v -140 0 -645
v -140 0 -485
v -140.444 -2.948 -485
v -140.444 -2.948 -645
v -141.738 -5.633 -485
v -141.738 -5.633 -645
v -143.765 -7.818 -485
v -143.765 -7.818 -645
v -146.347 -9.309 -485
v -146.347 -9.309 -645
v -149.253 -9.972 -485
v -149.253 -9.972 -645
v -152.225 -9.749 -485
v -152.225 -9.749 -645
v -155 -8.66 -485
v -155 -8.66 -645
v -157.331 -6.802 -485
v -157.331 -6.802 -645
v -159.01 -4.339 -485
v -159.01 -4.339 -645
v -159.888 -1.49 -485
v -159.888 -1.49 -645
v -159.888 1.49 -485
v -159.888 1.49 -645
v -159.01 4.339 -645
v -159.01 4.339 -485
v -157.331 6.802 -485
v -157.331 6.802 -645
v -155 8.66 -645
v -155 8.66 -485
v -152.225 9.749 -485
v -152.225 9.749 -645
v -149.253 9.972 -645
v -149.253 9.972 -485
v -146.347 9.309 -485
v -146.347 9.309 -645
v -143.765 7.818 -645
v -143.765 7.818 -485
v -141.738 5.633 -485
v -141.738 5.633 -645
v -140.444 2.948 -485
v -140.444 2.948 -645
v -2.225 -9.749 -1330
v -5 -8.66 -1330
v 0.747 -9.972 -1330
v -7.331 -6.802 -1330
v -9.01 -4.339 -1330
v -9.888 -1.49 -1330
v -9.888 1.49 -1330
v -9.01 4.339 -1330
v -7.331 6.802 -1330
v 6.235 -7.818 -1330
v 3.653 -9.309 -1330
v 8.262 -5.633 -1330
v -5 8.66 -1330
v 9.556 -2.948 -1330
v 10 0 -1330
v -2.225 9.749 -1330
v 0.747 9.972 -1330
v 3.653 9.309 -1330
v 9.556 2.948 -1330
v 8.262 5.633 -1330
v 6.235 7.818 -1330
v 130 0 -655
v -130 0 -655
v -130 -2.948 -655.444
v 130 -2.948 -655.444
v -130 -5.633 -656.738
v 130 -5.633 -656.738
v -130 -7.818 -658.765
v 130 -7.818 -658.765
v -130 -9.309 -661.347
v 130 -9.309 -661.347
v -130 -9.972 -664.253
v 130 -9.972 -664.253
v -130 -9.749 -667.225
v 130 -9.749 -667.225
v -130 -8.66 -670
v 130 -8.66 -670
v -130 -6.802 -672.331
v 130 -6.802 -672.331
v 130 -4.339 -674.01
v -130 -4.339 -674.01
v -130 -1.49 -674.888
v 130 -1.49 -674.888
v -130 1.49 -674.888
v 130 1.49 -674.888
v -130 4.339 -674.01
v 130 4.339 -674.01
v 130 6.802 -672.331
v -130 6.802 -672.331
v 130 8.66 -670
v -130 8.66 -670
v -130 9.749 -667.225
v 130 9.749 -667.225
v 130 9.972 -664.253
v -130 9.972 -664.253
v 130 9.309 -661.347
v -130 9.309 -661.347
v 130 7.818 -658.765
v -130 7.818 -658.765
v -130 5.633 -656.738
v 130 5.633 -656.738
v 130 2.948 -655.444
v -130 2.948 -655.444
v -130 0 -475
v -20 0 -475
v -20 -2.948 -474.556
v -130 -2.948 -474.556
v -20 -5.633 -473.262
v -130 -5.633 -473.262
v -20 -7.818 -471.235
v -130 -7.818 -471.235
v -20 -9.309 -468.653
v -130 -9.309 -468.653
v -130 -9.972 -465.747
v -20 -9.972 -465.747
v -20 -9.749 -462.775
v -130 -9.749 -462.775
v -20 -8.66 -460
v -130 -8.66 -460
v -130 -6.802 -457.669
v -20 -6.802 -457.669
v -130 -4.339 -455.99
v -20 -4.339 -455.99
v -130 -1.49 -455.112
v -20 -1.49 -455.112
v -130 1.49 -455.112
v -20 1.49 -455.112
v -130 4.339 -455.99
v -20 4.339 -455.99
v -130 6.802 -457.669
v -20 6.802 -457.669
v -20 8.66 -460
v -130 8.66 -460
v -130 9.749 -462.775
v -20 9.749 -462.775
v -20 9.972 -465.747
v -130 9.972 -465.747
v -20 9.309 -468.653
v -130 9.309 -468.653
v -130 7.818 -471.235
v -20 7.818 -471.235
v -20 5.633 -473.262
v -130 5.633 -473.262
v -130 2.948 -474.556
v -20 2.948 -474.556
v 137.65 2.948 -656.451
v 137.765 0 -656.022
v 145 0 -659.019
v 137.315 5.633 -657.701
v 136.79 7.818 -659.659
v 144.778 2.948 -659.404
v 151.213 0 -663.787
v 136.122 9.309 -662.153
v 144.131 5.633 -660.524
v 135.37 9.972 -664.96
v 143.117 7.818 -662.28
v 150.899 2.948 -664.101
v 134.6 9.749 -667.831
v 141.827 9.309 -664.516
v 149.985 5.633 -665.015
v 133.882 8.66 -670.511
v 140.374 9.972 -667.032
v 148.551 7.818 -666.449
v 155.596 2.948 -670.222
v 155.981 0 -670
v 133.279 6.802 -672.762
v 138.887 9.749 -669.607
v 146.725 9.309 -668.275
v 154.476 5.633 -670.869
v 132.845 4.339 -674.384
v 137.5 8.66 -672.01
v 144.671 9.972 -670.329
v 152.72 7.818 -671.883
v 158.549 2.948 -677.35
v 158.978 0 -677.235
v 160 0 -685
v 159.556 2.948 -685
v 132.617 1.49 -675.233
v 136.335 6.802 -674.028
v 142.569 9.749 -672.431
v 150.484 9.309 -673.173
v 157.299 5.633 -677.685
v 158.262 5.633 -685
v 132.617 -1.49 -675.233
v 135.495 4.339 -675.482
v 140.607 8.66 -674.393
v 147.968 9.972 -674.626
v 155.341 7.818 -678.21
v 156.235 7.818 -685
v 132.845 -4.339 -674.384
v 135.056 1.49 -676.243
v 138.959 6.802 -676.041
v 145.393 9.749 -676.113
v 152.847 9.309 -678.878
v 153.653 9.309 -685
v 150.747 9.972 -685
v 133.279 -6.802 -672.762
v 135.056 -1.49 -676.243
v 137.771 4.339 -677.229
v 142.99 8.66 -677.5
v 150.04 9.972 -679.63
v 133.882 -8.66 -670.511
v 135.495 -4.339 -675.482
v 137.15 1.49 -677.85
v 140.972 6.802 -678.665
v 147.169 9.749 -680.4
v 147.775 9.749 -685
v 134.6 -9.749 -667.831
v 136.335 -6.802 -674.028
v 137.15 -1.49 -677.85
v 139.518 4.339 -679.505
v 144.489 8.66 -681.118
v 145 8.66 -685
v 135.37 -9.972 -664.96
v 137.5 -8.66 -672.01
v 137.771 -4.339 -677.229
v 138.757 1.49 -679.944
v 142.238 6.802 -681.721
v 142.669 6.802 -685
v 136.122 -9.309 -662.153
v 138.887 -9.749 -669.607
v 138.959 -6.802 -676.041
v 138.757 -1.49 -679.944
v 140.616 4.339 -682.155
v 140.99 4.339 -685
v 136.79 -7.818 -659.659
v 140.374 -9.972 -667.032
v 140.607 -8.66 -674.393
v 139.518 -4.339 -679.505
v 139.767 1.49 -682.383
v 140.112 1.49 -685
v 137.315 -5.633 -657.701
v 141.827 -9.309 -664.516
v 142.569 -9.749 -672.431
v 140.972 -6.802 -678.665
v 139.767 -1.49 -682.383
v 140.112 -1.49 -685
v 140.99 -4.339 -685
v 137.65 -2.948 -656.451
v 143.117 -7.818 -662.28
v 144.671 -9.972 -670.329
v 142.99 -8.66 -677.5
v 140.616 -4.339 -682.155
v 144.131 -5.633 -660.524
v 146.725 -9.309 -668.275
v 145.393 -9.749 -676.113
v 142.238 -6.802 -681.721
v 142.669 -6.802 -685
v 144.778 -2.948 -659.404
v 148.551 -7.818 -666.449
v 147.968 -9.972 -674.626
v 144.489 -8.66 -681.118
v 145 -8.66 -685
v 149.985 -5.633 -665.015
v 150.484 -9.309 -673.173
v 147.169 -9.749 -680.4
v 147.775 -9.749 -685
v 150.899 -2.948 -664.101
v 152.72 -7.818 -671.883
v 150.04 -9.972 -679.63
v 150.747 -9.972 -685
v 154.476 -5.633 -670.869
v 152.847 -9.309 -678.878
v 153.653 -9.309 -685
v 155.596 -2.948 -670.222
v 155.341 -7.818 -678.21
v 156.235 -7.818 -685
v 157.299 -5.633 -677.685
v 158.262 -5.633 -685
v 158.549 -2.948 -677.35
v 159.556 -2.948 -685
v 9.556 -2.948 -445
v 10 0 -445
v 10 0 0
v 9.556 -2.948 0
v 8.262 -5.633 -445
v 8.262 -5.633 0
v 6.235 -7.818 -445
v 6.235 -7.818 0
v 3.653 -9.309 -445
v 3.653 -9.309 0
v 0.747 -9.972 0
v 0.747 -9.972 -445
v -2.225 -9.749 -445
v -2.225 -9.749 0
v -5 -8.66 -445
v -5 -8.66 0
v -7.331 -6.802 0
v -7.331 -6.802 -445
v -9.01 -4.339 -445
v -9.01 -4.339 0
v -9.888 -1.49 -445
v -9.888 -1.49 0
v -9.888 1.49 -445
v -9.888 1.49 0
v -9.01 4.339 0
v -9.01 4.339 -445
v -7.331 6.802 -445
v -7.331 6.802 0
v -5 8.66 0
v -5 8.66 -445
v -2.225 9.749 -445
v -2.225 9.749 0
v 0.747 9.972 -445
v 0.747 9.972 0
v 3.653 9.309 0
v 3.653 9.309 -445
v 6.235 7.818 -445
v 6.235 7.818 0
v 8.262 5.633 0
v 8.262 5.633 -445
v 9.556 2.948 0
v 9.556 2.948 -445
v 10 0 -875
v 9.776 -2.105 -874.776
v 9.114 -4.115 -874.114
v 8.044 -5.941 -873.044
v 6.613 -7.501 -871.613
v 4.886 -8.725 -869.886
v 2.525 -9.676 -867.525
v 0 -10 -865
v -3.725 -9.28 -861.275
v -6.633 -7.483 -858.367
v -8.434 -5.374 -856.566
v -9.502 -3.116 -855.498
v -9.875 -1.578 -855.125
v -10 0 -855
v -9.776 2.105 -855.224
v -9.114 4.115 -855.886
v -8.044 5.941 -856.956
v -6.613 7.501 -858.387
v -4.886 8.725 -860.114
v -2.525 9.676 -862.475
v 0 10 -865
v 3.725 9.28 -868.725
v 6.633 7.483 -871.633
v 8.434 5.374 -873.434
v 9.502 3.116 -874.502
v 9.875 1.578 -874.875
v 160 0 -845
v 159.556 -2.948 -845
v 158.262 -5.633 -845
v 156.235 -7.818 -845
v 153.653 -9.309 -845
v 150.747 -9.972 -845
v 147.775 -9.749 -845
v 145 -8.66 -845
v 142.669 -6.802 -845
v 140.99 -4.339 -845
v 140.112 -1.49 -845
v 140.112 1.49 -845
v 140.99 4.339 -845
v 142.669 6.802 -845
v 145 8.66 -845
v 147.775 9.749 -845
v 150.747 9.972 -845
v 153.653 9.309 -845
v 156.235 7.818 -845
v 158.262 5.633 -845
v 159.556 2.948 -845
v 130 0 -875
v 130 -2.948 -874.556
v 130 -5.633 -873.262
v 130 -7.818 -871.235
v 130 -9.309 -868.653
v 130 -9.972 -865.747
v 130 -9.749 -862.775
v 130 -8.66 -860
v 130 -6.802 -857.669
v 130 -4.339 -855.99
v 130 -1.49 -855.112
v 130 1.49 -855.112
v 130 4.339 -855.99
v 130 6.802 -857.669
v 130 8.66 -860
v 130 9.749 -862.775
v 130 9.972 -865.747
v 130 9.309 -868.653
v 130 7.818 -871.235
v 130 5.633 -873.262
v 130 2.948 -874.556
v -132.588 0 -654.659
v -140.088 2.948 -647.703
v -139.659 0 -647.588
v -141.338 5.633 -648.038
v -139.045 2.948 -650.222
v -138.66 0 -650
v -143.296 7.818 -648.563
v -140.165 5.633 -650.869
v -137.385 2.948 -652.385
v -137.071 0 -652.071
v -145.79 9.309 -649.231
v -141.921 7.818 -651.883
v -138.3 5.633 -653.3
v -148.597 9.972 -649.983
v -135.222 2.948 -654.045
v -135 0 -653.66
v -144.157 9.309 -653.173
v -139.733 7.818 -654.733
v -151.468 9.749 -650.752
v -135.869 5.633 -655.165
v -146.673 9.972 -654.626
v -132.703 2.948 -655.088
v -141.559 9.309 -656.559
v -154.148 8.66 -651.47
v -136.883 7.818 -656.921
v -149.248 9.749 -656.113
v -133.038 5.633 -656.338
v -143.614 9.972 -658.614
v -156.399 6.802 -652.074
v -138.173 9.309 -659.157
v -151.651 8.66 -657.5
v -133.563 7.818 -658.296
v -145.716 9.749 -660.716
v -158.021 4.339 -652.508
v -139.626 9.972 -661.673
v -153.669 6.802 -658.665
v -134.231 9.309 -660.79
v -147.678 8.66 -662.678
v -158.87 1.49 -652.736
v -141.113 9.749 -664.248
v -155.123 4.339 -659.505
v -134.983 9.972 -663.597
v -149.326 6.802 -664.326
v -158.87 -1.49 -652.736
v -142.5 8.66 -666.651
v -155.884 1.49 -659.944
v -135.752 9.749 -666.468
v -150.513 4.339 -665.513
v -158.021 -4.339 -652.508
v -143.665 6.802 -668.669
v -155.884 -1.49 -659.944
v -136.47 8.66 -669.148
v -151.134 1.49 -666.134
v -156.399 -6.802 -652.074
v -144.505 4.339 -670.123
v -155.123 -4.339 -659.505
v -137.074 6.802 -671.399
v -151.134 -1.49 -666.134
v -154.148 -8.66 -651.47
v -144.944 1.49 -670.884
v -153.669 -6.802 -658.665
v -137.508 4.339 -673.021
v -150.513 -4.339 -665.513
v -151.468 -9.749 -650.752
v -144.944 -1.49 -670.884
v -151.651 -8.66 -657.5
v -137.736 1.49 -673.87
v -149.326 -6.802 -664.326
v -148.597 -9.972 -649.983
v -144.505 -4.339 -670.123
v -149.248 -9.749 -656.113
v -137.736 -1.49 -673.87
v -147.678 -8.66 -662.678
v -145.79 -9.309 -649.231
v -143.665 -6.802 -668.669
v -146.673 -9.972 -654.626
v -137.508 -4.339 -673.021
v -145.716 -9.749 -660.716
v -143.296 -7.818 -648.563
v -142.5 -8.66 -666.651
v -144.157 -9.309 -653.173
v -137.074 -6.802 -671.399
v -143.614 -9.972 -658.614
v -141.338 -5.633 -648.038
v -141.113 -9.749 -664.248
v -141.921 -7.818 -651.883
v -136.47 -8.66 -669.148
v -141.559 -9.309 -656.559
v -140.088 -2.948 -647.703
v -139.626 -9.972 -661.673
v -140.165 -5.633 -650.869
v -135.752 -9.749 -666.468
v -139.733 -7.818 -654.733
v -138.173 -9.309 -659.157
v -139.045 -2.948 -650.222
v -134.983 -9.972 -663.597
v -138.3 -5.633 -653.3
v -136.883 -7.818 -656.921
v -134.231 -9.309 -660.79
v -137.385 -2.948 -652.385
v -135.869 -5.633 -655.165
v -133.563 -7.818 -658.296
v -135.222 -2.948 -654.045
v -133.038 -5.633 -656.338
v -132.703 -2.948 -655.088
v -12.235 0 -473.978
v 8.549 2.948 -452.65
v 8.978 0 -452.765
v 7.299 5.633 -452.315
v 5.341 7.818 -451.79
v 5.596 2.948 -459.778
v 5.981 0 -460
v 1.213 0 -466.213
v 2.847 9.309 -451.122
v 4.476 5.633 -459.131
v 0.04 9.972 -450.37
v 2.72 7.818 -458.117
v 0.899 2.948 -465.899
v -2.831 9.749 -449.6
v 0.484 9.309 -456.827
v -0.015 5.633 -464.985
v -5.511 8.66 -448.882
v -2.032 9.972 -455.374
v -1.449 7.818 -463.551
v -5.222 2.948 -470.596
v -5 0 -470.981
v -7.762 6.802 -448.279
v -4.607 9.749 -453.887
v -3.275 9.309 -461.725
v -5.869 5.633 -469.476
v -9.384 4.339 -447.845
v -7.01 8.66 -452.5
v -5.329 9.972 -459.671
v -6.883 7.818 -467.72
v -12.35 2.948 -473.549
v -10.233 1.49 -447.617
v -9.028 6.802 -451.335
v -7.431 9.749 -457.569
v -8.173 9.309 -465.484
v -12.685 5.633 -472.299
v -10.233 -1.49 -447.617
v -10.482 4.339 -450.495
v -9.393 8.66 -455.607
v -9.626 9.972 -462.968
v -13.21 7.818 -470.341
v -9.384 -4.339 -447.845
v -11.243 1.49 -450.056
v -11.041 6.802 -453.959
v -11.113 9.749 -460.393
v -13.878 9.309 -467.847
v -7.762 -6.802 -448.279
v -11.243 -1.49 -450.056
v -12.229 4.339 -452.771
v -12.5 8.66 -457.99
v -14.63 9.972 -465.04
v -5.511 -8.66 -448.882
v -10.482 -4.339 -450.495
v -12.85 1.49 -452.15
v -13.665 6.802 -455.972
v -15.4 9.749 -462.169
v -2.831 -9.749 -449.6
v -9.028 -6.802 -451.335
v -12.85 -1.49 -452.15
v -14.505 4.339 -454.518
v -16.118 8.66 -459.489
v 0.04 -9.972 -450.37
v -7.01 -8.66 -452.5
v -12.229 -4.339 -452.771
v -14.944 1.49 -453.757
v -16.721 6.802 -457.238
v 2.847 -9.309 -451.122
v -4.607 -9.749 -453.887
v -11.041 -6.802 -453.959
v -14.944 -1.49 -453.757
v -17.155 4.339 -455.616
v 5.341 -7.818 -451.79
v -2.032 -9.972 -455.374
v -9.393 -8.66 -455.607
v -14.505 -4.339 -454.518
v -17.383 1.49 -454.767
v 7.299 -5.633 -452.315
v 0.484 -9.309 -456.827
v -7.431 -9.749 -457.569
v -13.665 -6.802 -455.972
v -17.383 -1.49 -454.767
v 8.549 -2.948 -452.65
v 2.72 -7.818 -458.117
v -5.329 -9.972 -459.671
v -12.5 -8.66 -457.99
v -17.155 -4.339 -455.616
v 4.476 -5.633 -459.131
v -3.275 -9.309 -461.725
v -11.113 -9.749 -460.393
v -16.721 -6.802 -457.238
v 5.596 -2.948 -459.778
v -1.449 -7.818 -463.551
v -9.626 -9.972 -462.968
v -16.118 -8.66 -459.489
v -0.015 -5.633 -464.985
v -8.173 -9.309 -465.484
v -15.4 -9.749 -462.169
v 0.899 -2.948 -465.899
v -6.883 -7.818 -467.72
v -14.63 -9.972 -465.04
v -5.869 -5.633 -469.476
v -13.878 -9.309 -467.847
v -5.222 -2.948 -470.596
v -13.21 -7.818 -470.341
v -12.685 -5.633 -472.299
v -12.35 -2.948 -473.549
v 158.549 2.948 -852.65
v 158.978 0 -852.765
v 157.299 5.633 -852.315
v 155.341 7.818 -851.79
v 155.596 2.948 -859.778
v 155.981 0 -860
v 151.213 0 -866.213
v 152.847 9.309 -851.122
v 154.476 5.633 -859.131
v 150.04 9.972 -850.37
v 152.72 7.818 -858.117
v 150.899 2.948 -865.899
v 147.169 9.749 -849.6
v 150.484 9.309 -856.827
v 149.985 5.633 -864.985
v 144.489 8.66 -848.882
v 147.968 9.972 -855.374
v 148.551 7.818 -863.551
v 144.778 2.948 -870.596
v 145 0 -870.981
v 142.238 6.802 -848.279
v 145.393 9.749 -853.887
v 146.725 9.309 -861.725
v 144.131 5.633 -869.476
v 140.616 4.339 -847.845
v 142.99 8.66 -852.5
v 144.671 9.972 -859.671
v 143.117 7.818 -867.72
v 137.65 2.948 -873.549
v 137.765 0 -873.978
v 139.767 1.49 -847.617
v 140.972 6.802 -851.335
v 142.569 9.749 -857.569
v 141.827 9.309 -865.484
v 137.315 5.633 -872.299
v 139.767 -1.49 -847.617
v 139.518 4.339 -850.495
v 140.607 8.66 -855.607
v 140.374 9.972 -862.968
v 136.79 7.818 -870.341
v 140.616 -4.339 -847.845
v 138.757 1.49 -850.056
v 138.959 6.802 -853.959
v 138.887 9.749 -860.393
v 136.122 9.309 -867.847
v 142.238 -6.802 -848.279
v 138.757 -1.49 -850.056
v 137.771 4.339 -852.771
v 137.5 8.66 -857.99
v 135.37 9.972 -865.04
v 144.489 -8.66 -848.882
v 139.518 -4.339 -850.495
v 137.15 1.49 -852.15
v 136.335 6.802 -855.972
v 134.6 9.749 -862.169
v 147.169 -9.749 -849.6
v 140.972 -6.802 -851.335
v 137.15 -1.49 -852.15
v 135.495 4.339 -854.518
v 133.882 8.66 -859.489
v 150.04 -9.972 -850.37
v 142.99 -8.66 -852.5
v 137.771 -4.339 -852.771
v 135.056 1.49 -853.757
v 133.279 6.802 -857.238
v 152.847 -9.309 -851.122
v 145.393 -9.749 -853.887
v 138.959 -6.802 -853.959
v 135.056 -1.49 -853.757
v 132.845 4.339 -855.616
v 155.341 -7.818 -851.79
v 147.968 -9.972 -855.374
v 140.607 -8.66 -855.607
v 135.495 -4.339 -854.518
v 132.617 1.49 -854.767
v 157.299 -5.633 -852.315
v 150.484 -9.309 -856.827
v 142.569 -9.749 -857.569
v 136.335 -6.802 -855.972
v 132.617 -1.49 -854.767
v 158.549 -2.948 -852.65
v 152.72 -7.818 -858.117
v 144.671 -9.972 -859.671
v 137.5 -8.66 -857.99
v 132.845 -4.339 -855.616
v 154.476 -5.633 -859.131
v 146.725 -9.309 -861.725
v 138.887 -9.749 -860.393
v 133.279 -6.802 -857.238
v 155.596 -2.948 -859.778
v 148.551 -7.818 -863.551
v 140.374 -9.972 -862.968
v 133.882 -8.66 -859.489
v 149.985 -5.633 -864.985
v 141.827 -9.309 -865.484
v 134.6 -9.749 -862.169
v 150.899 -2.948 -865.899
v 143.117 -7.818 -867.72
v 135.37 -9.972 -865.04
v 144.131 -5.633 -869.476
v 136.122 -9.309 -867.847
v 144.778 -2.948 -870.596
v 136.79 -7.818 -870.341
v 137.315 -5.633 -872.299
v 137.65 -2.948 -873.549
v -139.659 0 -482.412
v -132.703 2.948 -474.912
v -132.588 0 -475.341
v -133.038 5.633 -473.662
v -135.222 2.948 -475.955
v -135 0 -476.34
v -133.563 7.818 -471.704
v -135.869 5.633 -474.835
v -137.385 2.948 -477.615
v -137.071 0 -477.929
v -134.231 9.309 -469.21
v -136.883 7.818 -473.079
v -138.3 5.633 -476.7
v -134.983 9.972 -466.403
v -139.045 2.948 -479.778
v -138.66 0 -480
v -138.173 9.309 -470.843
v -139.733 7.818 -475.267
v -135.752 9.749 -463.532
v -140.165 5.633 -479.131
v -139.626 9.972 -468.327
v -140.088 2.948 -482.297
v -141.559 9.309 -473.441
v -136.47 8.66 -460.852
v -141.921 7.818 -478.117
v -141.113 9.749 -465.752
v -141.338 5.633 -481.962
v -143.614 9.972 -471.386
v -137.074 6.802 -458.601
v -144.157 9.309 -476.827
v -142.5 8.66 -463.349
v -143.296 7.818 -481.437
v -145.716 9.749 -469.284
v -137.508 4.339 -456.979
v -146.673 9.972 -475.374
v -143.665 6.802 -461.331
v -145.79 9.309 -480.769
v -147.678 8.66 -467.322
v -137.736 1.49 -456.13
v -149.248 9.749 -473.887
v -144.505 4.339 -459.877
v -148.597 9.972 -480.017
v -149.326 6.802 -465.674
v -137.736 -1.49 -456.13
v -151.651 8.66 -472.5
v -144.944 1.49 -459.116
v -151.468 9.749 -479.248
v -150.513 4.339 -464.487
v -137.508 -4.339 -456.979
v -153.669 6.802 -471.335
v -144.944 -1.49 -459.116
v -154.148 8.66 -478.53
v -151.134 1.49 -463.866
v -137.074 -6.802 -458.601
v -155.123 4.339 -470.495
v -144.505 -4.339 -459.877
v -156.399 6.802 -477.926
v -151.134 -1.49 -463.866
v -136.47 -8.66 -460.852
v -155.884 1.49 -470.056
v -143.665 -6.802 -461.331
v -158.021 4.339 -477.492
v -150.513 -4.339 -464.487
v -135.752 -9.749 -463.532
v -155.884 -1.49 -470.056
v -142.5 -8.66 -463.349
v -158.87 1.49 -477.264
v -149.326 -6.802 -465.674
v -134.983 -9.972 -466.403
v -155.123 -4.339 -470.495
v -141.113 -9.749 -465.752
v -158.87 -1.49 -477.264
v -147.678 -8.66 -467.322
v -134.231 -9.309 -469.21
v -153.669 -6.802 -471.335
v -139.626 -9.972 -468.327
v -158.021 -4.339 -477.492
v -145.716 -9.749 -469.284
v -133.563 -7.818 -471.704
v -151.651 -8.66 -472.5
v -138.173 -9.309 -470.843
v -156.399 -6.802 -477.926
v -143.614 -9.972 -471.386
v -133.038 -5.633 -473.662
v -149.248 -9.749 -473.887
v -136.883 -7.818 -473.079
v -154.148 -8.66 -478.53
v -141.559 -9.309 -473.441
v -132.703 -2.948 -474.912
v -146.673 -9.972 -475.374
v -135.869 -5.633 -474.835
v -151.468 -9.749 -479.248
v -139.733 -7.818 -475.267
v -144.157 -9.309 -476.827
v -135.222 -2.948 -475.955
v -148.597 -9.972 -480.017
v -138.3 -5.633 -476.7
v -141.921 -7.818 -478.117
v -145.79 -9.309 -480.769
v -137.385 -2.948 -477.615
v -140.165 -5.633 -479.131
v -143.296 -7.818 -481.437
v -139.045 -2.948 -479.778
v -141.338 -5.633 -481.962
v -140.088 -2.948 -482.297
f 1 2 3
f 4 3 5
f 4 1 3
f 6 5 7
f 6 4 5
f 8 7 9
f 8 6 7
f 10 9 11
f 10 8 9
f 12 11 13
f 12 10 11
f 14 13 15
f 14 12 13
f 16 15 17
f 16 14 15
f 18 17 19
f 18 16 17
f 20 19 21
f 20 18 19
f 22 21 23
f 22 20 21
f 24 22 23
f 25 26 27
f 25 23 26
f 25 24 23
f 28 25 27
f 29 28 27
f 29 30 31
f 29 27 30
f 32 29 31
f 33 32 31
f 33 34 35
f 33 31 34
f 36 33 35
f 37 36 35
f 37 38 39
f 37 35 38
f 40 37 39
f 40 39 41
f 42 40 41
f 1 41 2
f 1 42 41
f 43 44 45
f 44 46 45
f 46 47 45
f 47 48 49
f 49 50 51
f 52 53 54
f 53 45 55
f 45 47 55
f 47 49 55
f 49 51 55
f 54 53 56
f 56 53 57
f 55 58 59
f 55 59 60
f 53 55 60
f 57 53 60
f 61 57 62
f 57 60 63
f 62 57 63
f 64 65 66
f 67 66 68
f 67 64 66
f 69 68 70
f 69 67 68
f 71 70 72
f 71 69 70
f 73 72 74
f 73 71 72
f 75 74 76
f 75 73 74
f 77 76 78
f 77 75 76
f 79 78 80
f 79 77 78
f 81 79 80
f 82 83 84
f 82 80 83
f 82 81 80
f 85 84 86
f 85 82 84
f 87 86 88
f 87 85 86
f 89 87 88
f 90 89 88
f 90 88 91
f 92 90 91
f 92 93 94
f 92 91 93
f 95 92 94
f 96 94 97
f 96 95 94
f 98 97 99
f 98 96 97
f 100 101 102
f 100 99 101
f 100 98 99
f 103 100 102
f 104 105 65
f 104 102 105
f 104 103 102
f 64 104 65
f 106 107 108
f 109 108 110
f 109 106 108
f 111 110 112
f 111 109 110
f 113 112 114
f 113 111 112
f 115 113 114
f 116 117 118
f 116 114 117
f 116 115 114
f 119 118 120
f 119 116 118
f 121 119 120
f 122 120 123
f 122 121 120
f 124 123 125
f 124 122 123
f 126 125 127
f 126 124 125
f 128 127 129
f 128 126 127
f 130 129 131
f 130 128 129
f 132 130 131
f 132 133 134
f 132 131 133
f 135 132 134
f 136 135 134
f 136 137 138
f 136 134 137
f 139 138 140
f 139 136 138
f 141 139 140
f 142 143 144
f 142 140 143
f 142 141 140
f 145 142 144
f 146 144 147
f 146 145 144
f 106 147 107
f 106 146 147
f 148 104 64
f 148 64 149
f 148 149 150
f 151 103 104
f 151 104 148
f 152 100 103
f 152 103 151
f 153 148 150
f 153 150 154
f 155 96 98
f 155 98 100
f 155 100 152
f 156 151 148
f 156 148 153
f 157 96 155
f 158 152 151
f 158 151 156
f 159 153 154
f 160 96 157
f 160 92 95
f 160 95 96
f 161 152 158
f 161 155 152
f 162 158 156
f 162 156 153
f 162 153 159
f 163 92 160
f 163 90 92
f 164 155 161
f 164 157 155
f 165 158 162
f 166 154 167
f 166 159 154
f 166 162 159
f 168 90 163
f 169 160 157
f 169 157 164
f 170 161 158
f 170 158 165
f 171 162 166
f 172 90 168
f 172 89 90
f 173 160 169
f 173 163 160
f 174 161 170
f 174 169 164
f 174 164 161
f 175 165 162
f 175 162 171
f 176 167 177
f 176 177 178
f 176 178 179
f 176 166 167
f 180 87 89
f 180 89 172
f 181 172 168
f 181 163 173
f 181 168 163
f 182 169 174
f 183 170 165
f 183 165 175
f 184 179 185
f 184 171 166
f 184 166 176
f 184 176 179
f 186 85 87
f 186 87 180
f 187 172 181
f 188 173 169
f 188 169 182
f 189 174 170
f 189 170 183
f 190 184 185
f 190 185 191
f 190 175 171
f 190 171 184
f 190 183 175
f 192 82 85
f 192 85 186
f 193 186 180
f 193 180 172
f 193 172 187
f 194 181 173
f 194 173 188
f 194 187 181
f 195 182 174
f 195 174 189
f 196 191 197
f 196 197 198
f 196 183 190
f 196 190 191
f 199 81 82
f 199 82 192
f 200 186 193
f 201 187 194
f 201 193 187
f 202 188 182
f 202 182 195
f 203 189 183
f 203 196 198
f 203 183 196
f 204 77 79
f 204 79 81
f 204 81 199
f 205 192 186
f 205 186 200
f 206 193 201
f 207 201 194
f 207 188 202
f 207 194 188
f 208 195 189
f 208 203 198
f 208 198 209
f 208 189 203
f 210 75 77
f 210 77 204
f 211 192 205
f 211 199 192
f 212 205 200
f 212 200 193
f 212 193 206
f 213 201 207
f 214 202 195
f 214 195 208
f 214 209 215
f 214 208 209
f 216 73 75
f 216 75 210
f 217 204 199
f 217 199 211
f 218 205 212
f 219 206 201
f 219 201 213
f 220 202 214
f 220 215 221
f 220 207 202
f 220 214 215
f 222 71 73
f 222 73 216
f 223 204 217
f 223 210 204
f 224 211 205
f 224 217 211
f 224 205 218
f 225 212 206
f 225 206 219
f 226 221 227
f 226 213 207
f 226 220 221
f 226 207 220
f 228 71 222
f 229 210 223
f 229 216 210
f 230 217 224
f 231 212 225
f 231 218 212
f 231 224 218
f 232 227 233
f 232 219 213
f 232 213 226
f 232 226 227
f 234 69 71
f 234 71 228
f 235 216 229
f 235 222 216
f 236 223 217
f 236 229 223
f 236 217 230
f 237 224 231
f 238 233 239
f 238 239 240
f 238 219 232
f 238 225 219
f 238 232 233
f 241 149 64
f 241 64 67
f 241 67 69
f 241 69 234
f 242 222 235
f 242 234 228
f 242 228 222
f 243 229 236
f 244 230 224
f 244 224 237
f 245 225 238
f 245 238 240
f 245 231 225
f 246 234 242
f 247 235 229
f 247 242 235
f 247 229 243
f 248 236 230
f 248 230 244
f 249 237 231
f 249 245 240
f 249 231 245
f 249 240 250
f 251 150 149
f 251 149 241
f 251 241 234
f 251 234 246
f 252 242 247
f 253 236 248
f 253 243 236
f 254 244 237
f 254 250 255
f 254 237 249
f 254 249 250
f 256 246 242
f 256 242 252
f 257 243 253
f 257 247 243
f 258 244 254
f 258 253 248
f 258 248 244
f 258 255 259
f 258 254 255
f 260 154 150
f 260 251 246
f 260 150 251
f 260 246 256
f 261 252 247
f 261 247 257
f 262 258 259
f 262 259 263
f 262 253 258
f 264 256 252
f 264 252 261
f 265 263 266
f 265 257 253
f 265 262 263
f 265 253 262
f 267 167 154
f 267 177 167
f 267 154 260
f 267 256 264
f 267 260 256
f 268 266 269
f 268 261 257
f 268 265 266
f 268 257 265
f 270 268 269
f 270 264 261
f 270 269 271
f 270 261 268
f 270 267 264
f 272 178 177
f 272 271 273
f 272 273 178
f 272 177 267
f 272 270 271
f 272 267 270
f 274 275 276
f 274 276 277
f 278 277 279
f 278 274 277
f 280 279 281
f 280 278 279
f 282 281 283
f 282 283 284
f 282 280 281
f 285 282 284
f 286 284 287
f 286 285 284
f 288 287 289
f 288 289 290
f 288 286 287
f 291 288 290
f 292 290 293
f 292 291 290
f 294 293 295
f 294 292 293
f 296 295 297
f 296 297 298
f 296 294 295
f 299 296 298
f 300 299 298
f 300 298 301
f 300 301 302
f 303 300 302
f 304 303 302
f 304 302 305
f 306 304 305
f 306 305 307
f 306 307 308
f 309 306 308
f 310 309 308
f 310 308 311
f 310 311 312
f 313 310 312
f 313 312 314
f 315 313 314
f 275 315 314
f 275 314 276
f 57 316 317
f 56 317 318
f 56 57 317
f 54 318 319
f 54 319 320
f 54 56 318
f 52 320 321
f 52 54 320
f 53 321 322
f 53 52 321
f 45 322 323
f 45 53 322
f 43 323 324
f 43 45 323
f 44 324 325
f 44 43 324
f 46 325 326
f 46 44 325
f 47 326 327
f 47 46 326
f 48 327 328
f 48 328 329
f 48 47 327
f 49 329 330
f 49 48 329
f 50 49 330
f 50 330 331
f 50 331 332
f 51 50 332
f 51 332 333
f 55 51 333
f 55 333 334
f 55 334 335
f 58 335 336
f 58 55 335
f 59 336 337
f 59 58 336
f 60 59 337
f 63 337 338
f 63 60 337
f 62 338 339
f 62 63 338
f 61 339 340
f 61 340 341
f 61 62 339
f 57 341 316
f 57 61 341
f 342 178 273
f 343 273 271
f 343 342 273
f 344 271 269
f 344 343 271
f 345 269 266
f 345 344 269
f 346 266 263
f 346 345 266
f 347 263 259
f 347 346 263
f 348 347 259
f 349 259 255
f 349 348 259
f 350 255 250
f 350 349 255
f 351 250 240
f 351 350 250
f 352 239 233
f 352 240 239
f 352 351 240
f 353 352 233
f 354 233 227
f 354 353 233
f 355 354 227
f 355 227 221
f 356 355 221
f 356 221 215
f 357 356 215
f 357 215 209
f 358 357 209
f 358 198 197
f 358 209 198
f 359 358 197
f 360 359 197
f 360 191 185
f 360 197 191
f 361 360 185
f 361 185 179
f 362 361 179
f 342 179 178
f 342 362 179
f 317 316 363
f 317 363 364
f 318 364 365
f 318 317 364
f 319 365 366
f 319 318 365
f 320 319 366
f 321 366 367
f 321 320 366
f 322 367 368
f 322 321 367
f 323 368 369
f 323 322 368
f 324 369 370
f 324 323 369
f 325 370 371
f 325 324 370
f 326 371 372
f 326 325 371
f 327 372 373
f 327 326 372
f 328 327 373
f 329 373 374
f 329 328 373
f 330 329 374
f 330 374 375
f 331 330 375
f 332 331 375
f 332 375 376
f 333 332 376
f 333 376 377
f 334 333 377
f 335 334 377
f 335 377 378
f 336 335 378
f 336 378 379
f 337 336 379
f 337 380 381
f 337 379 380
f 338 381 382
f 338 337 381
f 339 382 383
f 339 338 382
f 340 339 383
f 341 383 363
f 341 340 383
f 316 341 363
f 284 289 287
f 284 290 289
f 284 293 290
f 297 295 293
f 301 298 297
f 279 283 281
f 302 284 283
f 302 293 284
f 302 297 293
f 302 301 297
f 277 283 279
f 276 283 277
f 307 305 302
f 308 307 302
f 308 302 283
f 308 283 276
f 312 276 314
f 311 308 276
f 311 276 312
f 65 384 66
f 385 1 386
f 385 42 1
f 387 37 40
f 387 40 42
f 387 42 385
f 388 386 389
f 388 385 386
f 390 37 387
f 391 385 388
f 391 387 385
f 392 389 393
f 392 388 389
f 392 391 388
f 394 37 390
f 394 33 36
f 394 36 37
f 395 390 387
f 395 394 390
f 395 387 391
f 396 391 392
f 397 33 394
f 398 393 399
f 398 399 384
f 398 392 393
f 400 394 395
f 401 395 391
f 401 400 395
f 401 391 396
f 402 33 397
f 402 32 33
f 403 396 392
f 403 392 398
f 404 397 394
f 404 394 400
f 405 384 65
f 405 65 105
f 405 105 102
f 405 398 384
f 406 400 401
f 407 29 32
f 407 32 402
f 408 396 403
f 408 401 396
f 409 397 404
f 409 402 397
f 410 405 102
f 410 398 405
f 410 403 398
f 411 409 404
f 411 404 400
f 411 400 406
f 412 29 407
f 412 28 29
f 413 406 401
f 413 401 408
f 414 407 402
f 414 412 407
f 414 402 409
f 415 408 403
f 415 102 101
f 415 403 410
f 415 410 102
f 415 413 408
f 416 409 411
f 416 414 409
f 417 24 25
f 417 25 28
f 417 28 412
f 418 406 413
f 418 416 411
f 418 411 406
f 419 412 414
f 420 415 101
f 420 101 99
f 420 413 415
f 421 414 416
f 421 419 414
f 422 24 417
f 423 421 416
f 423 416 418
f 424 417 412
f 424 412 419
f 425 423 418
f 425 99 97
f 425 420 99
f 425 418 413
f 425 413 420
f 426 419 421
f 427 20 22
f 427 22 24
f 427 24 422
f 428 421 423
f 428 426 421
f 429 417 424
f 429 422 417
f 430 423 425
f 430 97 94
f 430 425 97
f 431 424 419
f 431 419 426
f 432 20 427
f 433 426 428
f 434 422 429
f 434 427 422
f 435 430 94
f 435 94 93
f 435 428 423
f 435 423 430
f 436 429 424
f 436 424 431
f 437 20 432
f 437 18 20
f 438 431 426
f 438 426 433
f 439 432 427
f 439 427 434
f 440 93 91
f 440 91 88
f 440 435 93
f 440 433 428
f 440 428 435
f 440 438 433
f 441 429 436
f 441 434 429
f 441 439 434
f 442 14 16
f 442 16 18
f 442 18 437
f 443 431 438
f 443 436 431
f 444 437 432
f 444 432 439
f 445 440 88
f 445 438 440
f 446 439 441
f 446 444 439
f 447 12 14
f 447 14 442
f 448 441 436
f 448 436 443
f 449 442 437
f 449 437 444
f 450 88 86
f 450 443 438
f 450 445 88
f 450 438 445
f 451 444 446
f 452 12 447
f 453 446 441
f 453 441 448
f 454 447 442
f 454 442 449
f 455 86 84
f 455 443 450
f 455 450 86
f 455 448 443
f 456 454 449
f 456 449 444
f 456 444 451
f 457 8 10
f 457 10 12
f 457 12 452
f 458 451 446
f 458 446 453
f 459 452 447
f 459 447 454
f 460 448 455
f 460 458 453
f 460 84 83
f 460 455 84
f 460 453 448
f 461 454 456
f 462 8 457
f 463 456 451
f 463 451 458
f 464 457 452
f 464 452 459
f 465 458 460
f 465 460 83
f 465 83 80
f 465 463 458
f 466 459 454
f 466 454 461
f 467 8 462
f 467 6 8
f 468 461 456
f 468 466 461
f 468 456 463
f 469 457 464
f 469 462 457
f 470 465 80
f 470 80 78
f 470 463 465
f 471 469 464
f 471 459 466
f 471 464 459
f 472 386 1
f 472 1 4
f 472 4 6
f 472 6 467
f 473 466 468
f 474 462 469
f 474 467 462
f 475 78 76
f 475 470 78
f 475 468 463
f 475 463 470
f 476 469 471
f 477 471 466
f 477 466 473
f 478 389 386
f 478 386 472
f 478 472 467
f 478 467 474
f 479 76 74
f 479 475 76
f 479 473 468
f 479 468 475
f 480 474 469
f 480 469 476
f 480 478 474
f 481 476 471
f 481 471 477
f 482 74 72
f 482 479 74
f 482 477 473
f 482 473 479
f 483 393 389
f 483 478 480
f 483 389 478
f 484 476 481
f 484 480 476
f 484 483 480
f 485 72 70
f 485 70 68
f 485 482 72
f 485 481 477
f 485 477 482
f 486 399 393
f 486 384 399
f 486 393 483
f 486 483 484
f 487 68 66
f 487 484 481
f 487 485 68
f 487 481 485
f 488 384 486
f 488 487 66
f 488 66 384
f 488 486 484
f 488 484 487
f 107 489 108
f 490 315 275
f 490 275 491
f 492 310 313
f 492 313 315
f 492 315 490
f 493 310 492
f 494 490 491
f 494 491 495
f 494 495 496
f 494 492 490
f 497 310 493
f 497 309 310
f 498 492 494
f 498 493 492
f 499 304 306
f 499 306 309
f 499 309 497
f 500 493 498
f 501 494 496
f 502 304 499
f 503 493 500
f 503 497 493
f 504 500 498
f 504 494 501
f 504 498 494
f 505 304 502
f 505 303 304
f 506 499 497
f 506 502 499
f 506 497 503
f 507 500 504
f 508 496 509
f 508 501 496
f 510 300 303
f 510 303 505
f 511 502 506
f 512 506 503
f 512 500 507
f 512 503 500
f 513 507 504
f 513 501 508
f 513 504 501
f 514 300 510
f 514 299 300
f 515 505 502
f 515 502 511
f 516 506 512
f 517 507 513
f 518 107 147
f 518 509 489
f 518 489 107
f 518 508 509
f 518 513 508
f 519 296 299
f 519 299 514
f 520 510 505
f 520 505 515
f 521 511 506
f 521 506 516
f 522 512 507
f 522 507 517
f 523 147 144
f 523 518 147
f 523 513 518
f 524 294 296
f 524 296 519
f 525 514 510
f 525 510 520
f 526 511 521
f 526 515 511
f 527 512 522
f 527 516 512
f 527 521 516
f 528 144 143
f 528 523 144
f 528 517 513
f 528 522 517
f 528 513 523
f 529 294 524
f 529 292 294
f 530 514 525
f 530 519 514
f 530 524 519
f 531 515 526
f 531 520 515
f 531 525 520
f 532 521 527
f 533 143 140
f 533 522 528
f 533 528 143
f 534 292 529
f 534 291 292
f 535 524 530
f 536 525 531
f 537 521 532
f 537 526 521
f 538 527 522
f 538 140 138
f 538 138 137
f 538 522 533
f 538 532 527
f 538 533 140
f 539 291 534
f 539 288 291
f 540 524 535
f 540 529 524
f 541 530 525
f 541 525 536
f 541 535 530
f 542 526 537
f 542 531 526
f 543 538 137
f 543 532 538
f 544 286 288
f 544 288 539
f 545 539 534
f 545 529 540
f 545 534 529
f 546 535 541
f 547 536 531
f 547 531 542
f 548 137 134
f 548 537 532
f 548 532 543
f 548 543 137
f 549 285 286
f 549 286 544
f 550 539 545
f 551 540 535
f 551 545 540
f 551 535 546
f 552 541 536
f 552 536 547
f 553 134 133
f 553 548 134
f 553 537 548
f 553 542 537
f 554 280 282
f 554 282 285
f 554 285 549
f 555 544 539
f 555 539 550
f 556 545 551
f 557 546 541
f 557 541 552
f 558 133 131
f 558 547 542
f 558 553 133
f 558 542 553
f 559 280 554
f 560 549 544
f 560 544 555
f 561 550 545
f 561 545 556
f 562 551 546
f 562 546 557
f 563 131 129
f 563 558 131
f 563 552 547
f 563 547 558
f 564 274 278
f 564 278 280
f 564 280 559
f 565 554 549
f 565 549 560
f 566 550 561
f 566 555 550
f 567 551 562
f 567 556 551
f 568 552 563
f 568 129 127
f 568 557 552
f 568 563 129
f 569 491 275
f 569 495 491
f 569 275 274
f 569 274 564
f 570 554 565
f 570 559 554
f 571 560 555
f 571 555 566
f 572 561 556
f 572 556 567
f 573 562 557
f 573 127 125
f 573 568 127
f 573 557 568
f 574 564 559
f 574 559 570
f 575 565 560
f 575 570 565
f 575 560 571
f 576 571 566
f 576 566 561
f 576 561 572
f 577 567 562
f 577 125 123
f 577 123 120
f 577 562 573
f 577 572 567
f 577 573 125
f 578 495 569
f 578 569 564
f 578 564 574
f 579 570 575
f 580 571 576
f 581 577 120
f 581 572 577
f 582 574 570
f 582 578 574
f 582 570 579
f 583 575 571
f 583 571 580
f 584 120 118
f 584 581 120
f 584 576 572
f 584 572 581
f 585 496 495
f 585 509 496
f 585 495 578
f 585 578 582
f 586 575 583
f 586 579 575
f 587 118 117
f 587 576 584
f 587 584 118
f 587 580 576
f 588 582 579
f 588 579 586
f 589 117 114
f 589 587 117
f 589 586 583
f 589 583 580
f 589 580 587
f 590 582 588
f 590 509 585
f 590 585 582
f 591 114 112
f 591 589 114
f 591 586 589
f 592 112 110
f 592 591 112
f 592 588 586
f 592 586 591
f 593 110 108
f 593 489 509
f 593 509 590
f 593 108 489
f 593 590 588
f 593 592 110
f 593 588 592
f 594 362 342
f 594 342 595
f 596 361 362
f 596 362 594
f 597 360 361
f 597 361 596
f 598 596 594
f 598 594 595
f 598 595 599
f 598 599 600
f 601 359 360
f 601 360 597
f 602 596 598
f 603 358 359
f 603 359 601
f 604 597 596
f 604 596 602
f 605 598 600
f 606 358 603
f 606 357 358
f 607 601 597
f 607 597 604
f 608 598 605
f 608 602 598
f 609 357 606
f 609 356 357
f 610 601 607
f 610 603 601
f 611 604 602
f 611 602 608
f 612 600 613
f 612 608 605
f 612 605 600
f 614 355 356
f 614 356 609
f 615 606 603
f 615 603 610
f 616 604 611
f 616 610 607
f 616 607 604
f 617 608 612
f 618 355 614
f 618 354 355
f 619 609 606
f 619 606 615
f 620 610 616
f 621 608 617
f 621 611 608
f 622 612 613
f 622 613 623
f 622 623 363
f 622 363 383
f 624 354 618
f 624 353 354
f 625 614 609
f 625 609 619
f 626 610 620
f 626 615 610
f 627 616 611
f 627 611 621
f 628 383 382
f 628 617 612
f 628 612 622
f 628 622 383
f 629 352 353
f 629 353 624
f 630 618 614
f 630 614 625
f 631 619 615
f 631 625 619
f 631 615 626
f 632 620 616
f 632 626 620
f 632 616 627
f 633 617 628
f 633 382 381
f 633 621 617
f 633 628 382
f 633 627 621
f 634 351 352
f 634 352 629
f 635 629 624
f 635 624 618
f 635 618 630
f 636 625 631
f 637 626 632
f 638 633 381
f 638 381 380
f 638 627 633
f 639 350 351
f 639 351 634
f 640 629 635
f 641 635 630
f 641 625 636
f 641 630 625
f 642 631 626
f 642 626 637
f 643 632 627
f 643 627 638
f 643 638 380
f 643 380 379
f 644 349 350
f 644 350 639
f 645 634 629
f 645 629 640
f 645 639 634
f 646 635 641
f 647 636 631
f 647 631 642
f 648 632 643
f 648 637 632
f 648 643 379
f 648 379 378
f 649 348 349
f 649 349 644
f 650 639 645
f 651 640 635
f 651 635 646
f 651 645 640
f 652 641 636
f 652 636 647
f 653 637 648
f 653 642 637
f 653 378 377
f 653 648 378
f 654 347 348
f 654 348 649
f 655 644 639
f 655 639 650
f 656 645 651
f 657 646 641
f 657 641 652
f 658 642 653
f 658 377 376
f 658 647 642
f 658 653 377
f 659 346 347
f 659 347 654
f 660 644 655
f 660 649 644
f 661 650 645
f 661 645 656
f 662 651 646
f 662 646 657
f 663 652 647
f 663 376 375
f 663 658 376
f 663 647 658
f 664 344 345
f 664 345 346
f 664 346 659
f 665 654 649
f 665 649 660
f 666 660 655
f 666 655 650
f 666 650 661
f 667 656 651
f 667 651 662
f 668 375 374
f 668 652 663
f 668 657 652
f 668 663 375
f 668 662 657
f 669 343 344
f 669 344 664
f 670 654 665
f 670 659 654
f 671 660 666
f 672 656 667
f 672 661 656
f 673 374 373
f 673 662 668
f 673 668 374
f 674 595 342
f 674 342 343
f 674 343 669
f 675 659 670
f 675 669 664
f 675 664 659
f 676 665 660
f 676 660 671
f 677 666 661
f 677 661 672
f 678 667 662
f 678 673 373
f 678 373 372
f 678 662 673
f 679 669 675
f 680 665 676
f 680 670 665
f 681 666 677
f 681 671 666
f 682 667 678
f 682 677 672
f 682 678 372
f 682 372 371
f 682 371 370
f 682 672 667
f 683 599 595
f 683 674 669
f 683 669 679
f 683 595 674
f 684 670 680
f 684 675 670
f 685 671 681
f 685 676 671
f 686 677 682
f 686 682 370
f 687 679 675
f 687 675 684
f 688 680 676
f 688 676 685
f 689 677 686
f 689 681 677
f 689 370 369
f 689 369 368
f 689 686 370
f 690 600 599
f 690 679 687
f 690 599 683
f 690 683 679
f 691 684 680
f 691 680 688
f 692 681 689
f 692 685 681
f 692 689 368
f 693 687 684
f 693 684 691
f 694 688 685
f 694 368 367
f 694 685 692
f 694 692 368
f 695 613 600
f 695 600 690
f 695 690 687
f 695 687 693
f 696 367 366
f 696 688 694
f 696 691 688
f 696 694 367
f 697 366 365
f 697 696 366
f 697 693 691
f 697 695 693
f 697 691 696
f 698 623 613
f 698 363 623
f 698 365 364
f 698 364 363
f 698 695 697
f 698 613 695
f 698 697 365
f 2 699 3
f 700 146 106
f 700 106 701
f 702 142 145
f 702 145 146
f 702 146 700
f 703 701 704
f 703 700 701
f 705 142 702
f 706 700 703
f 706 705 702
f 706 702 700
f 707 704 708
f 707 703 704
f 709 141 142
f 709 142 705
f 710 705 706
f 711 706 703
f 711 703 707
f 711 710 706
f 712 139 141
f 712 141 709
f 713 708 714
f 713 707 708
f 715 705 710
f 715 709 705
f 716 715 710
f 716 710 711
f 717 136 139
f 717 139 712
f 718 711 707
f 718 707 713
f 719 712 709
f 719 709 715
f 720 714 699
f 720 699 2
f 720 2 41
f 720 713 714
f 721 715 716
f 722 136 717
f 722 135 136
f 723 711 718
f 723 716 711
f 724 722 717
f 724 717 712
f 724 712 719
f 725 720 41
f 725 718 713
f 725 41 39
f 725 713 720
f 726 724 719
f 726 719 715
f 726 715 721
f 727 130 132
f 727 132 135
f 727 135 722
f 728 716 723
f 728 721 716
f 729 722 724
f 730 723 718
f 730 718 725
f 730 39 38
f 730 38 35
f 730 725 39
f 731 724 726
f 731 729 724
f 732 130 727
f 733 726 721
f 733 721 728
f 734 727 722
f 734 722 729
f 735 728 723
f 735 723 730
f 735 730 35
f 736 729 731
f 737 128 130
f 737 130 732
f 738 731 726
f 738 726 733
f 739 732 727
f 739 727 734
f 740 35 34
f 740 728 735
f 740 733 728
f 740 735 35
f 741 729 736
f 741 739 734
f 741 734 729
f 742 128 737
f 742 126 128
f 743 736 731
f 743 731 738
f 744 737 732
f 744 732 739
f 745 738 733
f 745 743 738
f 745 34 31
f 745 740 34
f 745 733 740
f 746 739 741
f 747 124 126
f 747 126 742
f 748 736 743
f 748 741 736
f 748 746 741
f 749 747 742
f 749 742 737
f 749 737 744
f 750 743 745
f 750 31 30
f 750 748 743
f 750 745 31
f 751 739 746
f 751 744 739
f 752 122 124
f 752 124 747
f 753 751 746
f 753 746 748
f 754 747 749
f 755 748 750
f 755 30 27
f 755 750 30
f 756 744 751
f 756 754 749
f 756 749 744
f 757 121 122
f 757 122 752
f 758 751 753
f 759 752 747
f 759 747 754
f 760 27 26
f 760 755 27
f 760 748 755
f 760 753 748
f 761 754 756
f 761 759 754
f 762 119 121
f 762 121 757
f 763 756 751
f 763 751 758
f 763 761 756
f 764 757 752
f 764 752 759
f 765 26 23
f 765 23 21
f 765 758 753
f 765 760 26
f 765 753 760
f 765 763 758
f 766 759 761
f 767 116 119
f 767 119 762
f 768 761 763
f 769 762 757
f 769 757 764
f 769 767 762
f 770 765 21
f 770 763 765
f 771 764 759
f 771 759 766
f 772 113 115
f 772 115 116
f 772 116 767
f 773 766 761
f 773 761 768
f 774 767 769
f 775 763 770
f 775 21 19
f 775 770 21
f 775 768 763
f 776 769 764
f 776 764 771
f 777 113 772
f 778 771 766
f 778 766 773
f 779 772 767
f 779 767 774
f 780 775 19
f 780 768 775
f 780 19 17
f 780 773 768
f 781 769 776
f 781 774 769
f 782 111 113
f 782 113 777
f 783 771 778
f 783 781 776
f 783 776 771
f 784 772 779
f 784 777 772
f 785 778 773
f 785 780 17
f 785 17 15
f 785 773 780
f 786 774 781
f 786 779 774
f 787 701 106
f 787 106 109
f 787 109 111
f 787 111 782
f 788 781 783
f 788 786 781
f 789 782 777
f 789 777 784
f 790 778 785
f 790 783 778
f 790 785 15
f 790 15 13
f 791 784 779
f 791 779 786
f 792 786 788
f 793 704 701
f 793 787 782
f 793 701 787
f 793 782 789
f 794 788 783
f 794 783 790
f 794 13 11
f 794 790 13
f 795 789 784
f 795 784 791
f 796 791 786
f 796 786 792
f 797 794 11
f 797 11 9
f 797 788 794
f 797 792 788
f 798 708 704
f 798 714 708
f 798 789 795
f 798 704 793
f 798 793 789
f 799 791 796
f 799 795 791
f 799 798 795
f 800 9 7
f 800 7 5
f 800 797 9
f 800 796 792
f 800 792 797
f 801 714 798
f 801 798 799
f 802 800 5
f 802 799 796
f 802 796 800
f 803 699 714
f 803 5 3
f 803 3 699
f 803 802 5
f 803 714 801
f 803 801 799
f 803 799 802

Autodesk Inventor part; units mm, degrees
ref_plane "YZ Plane" through (0, 0, 0) normal (1, 0, 0) x (0, 1, 0)
ref_plane "XZ Plane" through (0, 0, 0) normal (0, 1, 0) x (-1, 0, 0)
ref_plane "XY Plane" through (0, 0, 0) normal (0, 0, 1) x (1, 0, 0)
sketch "Skizze1" plane through (0, 0, 0) normal (0, 1, 0) x (-1, 0, 0)
  line L0 (0, 0) -> (0, -445)
  line L1 (20, -465) -> (130, -465)
  line L2 (150, -485) -> (150, -645)
  line L3 (130, -665) -> (-130, -665)
  line L4 (-150, -685) -> (-150, -845)
  line L5 (-130, -865) -> (0, -865)
  line L6 (0, -865) -> (0, -1330)
  arc A0 (150, -485) -> (130, -465) centre (130, -485) ccw
  arc A1 (130, -665) -> (150, -645) centre (130, -645) ccw
  arc A2 (0, -445) -> (20, -465) centre (20, -445) ccw
  arc A3 (-130, -665) -> (-150, -685) centre (-130, -685) ccw
  arc A4 (-150, -845) -> (-130, -865) centre (-130, -845) ccw
  point P0 (0, -465)
  point P1 (150, -465)
  point P2 (150, -665)
  point P3 (-150, -665)
  point P4 (-150, -865)
  dimension "lange1" = 465
  dimension "d1" = 150
  dimension "d2" = 200
  dimension "d3" = 300
  dimension "d4" = 200
  dimension "lange2" = 465
  dimension "d6" = 20
sketch "Skizze2" plane through (0, 0, 0) normal (0, 0, 1) x (1, 0, 0)
  circle A0 centre (0, 0) radius 10
  dimension "durchmesser" = 20
sweep "Sweeping1" add profiles "Skizze2" path "Skizze1"
properties part number "Trittstange" material "Edelstahl"
